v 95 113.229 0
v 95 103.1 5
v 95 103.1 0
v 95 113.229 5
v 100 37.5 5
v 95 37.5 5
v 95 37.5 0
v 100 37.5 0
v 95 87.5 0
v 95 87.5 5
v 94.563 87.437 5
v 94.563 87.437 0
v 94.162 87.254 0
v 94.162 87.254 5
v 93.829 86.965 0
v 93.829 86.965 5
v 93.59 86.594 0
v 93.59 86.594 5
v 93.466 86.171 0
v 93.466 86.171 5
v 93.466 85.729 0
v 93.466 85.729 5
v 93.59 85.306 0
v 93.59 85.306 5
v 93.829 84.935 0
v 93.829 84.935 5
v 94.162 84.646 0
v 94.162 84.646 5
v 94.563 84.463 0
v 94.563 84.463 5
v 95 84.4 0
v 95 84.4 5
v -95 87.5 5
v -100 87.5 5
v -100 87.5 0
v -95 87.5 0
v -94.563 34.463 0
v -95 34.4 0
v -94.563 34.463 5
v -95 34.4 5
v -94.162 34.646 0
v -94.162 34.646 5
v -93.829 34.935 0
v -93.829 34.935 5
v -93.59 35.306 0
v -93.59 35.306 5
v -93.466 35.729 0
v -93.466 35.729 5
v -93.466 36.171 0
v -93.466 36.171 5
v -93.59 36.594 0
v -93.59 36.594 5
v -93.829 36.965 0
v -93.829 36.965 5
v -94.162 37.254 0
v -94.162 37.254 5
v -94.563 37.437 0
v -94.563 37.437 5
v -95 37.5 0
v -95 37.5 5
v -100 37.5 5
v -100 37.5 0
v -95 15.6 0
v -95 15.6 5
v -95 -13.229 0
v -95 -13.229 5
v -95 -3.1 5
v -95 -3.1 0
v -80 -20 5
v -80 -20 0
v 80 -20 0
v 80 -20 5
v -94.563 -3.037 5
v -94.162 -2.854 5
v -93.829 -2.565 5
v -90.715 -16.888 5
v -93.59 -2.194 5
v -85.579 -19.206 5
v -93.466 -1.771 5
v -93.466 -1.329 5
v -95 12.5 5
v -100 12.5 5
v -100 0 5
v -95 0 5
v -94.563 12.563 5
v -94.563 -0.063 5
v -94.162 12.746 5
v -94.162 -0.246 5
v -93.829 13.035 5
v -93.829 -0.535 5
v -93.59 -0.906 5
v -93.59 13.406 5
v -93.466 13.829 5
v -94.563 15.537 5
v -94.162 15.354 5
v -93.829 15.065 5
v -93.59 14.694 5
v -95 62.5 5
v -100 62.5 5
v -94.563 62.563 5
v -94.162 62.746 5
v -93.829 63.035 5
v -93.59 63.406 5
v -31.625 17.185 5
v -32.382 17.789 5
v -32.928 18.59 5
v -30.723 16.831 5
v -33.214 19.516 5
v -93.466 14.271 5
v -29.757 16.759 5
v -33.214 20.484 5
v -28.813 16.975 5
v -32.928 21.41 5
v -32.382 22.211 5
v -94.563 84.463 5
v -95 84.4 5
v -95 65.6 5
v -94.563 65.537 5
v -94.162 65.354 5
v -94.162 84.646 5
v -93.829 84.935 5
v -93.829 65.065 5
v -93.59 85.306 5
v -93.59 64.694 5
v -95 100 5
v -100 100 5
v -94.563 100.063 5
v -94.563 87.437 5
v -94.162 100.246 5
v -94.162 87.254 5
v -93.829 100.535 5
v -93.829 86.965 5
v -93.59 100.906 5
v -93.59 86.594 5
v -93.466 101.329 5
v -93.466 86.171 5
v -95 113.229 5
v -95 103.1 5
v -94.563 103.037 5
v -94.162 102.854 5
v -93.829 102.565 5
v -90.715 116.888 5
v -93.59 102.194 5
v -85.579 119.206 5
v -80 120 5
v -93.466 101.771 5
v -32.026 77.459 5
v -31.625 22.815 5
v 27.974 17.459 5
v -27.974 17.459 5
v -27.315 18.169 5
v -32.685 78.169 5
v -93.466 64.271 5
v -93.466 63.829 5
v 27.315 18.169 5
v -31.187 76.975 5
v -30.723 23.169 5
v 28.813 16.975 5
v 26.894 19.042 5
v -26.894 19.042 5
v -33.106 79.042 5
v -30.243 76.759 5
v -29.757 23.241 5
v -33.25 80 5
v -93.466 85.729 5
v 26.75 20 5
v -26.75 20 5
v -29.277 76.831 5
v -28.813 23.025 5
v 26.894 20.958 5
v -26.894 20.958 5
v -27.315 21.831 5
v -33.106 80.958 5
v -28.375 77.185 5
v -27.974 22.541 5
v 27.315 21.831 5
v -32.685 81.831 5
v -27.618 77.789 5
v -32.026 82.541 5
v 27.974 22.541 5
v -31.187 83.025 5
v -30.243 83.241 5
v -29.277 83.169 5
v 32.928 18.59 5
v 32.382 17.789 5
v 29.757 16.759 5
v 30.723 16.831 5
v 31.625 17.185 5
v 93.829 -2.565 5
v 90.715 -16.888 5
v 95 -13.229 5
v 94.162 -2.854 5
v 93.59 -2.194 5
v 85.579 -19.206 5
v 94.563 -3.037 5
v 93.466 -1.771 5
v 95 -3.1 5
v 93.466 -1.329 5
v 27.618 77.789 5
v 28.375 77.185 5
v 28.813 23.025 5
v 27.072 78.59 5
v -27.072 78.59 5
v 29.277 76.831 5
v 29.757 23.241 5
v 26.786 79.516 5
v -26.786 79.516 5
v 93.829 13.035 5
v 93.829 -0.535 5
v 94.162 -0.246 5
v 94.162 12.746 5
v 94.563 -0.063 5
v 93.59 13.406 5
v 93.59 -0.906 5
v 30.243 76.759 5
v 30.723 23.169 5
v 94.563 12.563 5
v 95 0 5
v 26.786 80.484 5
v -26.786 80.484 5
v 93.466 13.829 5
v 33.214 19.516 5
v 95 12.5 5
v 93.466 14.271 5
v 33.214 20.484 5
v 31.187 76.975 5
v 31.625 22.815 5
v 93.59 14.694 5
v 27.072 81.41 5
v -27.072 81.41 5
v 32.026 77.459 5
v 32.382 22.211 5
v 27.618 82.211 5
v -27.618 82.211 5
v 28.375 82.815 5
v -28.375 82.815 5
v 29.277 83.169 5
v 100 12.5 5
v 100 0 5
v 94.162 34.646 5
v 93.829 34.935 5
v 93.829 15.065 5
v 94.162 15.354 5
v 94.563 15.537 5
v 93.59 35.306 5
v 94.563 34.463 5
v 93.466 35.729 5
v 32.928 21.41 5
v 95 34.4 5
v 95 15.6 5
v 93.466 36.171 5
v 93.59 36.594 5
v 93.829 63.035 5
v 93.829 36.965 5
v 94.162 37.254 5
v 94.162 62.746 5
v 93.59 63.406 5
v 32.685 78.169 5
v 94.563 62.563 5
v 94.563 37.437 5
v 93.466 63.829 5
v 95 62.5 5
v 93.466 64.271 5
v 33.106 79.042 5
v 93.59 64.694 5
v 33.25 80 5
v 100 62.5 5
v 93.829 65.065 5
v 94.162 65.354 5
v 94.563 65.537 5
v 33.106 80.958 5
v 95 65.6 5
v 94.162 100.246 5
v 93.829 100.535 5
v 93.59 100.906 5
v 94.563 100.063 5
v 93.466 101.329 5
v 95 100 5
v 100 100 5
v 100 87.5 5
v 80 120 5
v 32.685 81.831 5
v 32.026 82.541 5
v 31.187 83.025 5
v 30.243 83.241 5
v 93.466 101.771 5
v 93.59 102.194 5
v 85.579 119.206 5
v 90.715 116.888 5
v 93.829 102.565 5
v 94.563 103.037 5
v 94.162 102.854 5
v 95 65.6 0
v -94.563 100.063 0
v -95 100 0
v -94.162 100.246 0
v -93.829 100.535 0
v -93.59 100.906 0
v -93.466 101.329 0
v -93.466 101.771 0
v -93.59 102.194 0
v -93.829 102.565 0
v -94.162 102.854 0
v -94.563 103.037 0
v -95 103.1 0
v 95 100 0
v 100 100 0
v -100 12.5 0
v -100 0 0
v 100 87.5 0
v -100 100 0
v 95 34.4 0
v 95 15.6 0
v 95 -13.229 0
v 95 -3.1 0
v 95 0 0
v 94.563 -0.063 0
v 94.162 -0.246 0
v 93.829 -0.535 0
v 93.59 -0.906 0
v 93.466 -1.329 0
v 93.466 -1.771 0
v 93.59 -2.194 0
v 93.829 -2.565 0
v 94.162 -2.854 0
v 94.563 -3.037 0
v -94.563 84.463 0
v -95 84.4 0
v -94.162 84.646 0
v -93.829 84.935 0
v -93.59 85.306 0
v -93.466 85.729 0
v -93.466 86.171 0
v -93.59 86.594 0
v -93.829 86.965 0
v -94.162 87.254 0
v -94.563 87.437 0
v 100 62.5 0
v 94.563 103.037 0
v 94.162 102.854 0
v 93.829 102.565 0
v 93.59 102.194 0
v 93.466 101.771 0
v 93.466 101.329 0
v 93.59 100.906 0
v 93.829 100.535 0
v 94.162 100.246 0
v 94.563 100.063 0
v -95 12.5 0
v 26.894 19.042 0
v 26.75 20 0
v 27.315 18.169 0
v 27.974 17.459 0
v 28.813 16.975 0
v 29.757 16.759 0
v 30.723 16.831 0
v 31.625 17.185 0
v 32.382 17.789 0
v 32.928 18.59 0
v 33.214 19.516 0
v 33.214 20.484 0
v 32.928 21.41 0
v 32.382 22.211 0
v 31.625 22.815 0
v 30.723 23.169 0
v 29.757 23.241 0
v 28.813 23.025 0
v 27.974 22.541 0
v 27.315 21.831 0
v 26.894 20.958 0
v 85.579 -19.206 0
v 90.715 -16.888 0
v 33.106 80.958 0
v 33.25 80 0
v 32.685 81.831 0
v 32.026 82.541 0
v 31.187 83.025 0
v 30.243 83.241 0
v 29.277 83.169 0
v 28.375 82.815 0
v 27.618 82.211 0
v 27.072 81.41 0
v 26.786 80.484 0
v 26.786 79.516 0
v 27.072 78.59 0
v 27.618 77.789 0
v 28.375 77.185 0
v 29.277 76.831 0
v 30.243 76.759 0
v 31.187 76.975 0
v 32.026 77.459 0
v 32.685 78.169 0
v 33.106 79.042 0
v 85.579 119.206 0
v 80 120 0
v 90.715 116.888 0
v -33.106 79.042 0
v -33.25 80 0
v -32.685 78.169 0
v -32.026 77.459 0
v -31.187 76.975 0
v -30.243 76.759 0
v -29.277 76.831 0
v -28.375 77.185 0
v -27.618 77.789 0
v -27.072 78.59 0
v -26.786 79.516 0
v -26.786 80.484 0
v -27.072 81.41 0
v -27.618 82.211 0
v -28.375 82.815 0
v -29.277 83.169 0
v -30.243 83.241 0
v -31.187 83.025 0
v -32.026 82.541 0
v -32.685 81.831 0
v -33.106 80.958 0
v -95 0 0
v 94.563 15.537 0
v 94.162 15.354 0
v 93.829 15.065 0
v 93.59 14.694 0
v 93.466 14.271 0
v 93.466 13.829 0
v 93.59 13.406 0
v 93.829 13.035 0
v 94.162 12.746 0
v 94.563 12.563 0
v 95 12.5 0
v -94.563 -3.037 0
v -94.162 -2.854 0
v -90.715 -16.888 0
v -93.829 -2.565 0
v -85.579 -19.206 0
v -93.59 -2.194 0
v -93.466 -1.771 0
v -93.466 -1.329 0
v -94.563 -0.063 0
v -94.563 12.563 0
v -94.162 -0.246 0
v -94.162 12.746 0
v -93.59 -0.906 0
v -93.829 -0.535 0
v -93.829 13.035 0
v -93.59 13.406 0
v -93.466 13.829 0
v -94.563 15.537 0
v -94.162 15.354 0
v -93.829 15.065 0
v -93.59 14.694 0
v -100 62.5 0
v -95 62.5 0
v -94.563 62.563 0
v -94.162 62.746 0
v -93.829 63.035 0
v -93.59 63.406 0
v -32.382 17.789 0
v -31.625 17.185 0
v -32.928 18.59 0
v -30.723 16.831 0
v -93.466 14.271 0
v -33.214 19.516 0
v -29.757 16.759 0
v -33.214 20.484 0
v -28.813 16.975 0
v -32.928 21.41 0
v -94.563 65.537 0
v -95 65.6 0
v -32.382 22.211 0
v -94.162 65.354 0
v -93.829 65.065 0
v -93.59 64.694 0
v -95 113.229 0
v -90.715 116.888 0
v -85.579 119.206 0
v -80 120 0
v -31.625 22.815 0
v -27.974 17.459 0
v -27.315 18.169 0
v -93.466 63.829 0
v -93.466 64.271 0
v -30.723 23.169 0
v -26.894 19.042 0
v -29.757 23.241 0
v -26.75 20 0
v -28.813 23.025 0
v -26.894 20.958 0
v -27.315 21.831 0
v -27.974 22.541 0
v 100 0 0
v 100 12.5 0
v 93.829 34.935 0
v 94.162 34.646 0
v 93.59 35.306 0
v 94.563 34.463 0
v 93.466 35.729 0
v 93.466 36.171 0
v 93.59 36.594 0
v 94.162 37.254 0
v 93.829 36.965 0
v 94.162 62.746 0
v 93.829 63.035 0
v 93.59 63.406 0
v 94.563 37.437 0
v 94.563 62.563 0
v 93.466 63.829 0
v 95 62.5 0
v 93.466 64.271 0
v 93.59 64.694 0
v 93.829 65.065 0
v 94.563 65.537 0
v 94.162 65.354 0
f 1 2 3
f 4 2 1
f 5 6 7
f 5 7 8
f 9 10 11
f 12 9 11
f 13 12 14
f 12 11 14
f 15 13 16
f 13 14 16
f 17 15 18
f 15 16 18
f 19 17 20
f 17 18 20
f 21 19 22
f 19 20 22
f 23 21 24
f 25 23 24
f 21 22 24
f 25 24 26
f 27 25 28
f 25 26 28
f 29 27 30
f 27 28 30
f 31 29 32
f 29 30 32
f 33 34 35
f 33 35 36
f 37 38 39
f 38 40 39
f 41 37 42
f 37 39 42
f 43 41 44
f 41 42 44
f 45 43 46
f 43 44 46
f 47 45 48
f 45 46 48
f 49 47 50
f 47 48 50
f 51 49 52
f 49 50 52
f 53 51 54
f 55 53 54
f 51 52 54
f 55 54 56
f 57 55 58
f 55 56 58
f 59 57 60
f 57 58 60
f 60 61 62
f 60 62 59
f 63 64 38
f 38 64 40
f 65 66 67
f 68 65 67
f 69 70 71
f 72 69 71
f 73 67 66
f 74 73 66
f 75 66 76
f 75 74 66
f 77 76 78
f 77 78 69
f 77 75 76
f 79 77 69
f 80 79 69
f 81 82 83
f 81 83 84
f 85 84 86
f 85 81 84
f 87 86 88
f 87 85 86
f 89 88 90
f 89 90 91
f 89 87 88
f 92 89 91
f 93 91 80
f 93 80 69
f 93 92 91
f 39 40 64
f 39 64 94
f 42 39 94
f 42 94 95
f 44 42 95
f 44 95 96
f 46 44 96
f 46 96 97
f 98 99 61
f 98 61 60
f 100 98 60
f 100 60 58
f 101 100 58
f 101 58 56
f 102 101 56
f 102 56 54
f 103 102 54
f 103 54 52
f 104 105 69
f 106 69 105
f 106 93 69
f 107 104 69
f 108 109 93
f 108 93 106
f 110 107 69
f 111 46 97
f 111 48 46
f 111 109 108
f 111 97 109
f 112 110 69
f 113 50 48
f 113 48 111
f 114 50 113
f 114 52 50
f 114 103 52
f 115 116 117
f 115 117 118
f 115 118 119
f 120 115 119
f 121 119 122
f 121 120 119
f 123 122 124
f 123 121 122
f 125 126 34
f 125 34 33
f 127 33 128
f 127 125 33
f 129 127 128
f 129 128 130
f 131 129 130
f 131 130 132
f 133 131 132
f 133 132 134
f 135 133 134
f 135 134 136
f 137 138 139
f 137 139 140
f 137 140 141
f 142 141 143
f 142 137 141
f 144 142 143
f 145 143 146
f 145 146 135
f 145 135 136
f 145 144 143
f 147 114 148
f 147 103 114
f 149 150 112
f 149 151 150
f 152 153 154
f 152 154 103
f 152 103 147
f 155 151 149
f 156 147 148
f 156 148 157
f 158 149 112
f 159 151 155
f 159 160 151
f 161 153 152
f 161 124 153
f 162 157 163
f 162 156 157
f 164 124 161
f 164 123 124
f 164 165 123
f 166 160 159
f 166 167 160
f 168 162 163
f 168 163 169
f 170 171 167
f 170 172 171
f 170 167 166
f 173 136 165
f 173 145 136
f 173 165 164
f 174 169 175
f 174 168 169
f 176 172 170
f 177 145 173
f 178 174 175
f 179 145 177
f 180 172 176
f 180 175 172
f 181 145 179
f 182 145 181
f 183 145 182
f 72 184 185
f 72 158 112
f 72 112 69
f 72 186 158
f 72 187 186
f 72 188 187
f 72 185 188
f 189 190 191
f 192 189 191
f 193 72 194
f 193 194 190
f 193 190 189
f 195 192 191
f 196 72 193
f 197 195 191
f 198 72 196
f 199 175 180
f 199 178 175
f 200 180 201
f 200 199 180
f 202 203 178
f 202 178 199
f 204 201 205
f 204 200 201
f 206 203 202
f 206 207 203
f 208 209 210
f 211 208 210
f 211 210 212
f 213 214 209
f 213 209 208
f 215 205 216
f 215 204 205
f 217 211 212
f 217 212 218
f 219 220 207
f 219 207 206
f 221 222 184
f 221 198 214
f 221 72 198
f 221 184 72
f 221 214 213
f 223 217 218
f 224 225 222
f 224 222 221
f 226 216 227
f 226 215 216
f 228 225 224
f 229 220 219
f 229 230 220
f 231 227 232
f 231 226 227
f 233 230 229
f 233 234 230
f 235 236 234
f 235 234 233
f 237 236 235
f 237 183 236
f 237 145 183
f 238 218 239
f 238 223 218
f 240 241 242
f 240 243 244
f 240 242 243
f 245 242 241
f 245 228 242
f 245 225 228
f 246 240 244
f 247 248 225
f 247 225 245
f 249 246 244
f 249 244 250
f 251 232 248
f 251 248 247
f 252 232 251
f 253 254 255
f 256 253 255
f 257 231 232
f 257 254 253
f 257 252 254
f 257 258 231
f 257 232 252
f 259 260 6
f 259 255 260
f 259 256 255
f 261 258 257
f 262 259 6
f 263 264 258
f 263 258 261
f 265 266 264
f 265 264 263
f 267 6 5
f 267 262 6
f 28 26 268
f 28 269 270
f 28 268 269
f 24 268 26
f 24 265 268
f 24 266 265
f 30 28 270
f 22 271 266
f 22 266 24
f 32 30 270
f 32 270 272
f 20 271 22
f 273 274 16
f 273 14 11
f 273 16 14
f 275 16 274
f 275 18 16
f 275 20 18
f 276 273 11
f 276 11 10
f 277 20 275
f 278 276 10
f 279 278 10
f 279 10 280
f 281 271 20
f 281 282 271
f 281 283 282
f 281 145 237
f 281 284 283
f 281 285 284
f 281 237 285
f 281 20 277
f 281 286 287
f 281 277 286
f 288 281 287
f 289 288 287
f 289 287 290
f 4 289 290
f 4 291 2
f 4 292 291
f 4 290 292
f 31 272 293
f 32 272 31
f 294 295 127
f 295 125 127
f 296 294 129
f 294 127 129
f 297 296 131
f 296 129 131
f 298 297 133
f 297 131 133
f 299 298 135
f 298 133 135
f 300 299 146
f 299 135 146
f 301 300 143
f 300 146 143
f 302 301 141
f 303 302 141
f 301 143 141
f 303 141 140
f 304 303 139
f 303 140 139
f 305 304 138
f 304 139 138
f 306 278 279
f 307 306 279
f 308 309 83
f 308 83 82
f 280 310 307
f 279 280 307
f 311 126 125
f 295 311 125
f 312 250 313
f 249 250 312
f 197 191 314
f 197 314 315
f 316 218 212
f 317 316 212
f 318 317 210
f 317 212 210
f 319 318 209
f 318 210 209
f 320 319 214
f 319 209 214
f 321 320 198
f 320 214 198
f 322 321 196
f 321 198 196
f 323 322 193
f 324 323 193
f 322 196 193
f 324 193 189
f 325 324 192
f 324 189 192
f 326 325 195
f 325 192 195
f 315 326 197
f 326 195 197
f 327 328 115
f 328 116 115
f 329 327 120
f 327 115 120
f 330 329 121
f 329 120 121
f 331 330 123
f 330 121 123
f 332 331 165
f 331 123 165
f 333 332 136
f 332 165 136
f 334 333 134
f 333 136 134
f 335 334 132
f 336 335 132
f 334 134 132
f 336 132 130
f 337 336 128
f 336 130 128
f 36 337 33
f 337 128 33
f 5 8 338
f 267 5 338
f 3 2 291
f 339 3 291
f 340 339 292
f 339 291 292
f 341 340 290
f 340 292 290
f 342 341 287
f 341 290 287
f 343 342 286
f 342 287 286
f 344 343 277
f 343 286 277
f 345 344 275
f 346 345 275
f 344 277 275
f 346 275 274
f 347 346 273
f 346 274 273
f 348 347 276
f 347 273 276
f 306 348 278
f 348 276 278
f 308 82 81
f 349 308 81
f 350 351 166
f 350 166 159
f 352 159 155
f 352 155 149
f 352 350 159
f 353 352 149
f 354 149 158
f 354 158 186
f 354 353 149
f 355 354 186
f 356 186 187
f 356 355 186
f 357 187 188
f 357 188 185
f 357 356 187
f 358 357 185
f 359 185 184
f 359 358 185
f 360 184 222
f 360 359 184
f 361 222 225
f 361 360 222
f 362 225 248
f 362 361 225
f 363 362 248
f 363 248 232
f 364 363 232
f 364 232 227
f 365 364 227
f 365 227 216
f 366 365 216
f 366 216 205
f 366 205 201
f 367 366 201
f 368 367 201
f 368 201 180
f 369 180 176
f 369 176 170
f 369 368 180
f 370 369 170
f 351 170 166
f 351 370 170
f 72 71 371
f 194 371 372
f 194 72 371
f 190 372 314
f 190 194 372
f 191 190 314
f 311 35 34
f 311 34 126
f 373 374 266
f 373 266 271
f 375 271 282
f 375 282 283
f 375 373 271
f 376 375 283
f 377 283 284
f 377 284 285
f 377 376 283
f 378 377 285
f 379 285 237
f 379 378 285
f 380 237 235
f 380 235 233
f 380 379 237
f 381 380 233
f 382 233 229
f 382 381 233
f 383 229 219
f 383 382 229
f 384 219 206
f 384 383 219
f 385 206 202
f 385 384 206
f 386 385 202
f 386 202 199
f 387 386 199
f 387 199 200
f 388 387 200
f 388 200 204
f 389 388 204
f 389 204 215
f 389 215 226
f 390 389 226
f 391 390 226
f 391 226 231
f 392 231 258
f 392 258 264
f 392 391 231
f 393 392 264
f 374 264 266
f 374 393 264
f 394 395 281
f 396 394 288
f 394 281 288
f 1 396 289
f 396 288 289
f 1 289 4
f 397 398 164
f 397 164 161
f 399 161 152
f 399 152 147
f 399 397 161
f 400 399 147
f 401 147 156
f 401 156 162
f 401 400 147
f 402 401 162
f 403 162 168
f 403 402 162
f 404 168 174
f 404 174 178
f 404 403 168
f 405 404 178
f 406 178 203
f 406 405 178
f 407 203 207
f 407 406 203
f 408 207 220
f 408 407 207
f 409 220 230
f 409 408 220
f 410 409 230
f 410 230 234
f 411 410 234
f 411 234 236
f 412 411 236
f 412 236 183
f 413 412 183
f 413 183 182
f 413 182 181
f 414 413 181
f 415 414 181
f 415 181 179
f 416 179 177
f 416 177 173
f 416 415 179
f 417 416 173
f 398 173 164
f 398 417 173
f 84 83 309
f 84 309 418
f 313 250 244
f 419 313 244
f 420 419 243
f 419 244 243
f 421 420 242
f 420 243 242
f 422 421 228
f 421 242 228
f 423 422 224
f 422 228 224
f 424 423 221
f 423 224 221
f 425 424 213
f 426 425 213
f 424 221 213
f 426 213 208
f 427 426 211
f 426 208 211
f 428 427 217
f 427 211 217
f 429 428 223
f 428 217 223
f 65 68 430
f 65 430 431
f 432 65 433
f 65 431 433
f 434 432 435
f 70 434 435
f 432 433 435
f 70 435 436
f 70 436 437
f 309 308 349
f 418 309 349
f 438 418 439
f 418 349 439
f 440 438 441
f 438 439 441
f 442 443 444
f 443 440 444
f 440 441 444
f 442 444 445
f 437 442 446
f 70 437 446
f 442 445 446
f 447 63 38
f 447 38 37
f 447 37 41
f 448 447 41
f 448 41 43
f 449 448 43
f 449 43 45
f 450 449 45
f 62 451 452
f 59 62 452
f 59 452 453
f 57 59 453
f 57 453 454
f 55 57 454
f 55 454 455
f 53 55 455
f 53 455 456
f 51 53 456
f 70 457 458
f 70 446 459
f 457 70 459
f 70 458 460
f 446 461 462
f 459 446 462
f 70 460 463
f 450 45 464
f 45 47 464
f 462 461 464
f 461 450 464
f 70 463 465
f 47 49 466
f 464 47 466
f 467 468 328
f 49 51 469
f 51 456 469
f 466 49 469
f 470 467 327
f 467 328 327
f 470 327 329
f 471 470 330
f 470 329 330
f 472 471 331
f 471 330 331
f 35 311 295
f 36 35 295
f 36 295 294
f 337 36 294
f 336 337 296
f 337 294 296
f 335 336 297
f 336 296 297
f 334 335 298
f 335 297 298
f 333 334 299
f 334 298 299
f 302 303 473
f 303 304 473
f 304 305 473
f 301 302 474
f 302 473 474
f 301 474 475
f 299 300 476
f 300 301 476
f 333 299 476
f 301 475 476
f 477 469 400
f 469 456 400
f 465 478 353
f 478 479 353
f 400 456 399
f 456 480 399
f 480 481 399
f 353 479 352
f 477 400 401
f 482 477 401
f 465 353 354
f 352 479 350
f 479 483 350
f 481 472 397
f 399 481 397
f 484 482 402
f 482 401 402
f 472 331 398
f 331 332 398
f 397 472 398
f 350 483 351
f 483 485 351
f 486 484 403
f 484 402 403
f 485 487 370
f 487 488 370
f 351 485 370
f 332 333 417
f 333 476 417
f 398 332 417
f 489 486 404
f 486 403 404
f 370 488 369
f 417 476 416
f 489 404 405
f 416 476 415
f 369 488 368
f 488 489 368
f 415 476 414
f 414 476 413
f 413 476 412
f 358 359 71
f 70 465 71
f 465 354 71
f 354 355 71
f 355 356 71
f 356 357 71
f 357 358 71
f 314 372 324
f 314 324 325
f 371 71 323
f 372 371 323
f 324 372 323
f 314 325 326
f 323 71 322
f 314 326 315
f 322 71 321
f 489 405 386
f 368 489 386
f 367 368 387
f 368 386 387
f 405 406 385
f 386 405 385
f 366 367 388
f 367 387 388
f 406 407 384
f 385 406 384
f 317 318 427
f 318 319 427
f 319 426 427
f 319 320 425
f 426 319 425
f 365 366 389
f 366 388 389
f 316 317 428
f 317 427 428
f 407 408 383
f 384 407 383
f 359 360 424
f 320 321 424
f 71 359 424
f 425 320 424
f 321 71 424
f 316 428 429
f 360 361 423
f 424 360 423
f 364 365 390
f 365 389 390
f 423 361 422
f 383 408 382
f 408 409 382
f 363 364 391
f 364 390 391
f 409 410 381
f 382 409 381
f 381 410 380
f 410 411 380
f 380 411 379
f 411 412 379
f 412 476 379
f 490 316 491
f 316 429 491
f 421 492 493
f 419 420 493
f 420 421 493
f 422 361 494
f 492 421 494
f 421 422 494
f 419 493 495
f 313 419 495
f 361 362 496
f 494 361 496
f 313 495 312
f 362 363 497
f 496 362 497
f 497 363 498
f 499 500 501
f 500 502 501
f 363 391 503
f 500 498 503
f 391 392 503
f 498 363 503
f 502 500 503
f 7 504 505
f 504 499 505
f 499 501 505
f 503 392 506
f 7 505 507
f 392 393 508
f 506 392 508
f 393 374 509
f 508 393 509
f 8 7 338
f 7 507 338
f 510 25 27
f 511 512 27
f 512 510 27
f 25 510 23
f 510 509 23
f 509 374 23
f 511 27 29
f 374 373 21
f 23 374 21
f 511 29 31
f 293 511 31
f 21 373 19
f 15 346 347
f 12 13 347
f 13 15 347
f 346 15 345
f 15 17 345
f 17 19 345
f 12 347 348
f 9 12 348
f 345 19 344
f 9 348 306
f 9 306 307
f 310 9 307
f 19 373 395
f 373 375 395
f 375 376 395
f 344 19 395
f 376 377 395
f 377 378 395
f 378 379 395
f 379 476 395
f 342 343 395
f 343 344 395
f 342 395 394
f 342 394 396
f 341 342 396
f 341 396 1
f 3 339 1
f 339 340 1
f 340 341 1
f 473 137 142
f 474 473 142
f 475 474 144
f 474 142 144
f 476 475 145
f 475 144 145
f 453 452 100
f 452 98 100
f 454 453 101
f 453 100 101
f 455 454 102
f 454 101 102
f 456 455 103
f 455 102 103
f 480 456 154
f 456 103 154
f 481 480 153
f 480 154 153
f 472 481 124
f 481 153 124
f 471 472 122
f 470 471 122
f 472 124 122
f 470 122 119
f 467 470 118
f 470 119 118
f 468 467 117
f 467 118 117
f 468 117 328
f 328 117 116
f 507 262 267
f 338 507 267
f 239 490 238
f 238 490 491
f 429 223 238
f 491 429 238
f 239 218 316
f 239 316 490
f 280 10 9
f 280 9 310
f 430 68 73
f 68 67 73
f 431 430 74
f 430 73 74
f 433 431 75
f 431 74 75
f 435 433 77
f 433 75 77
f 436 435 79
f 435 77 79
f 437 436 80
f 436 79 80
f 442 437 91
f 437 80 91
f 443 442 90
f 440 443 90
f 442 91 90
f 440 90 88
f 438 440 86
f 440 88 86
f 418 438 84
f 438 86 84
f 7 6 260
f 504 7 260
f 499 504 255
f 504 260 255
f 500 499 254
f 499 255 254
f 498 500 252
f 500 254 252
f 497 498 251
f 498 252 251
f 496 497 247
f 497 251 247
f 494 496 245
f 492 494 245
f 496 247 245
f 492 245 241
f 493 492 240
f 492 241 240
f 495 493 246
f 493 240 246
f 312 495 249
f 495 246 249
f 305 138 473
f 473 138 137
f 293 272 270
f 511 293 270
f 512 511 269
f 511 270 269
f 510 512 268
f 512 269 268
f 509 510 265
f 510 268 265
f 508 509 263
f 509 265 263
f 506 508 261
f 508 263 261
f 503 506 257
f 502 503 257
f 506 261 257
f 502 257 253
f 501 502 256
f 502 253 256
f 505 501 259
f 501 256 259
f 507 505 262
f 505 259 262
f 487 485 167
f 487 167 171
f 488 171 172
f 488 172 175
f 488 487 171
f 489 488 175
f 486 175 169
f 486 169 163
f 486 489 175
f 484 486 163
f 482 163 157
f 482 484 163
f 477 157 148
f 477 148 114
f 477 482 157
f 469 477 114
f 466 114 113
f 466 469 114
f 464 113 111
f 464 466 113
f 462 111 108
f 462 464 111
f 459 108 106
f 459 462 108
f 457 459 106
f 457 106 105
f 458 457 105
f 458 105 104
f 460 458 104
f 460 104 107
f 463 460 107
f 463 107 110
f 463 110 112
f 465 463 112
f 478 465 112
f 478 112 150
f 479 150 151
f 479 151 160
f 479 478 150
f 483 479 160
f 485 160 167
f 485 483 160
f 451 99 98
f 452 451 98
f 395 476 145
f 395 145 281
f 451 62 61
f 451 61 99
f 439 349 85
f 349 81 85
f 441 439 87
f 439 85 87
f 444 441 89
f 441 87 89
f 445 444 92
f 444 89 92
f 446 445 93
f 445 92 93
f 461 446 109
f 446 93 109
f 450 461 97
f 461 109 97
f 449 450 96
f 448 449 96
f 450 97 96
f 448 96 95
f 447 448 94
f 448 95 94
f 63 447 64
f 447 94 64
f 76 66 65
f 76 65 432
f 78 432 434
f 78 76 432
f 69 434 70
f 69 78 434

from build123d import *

# Parameters (mm, degrees)
SKETCH_1_W          = 200
SKETCH_1_H          = 140
SKETCH_1_R          = 3.25
EXTRUDE_1_DEPTH     = 5
FILLET_1_R          = 20
SKETCH_3_W          = 5
SKETCH_3_H          = 25
SKETCH_3_H_2        = 22.807543944
CUT_EXTRUDE_1_DEPTH = 39
SKETCH_4_R          = 1.55
CUT_EXTRUDE_2_DEPTH = 10


with BuildPart() as part:
    # 草图1 → 凸台-拉伸1 (new body)
    with BuildSketch(Plane.XY):
        with Locations((0, 50)):
            Rectangle(SKETCH_1_W, SKETCH_1_H)
        with Locations((30, 80)):
            Circle(SKETCH_1_R, mode=Mode.SUBTRACT)
        with Locations(Location((30, 20, 0), (0, 0, 180))):
            Circle(SKETCH_1_R, mode=Mode.SUBTRACT)
        with Locations(Location((-30, 80, 0), (0, 0, 180))):
            Circle(SKETCH_1_R, mode=Mode.SUBTRACT)
        with Locations((-30, 20)):
            Circle(SKETCH_1_R, mode=Mode.SUBTRACT)
    extrude(amount=EXTRUDE_1_DEPTH)

    # 圆角1
    fillet_1_edges = [part.edges().sort_by_distance(p)[0] for p in [
        (-100, 120, 2.5),
        (-100, -20, 2.5),
        (100, -20, 2.5),
        (100, 120, 2.5),
    ]]
    fillet(fillet_1_edges, radius=FILLET_1_R)

    # 草图3 → 切除-拉伸1 (cut)
    with BuildSketch(Plane.XY.offset(5)):
        with Locations((97.5, 75)):
            Rectangle(SKETCH_3_W, SKETCH_3_H)
        with Locations((97.5, 25)):
            Rectangle(SKETCH_3_W, SKETCH_3_H)
        with Locations((-97.5, 25)):
            Rectangle(SKETCH_3_W, SKETCH_3_H)
        with Locations((-97.5, 75)):
            Rectangle(SKETCH_3_W, SKETCH_3_H)
        with Locations((-97.5, -11.403771972)):
            Rectangle(SKETCH_3_W, SKETCH_3_H_2)
        with Locations((97.5, -11.403771972)):
            Rectangle(SKETCH_3_W, SKETCH_3_H_2)
        with Locations((-97.5, 111.403771972)):
            Rectangle(SKETCH_3_W, SKETCH_3_H_2)
        with Locations((97.5, 111.403771972)):
            Rectangle(SKETCH_3_W, SKETCH_3_H_2)
    extrude(amount=-CUT_EXTRUDE_1_DEPTH, mode=Mode.SUBTRACT)

    # 草图4 → 切除-拉伸2 (cut)
    with BuildSketch(Plane.XY.offset(5)):
        with Locations((95, 85.95)):
            Circle(SKETCH_4_R)
        with Locations((95, 64.05)):
            Circle(SKETCH_4_R)
        with Locations((95, 35.95)):
            Circle(SKETCH_4_R)
        with Locations((95, 14.05)):
            Circle(SKETCH_4_R)
        with Locations((-95, 14.05)):
            Circle(SKETCH_4_R)
        with Locations((-95, 35.95)):
            Circle(SKETCH_4_R)
        with Locations((-95, 64.05)):
            Circle(SKETCH_4_R)
        with Locations((-95, 85.95)):
            Circle(SKETCH_4_R)
        with Locations((95, -1.55)):
            Circle(SKETCH_4_R)
        with Locations((-95, -1.55)):
            Circle(SKETCH_4_R)
        with Locations((95, 101.55)):
            Circle(SKETCH_4_R)
        with Locations((-95, 101.55)):
            Circle(SKETCH_4_R)
    extrude(amount=-CUT_EXTRUDE_2_DEPTH, mode=Mode.SUBTRACT)


solid = part.part
